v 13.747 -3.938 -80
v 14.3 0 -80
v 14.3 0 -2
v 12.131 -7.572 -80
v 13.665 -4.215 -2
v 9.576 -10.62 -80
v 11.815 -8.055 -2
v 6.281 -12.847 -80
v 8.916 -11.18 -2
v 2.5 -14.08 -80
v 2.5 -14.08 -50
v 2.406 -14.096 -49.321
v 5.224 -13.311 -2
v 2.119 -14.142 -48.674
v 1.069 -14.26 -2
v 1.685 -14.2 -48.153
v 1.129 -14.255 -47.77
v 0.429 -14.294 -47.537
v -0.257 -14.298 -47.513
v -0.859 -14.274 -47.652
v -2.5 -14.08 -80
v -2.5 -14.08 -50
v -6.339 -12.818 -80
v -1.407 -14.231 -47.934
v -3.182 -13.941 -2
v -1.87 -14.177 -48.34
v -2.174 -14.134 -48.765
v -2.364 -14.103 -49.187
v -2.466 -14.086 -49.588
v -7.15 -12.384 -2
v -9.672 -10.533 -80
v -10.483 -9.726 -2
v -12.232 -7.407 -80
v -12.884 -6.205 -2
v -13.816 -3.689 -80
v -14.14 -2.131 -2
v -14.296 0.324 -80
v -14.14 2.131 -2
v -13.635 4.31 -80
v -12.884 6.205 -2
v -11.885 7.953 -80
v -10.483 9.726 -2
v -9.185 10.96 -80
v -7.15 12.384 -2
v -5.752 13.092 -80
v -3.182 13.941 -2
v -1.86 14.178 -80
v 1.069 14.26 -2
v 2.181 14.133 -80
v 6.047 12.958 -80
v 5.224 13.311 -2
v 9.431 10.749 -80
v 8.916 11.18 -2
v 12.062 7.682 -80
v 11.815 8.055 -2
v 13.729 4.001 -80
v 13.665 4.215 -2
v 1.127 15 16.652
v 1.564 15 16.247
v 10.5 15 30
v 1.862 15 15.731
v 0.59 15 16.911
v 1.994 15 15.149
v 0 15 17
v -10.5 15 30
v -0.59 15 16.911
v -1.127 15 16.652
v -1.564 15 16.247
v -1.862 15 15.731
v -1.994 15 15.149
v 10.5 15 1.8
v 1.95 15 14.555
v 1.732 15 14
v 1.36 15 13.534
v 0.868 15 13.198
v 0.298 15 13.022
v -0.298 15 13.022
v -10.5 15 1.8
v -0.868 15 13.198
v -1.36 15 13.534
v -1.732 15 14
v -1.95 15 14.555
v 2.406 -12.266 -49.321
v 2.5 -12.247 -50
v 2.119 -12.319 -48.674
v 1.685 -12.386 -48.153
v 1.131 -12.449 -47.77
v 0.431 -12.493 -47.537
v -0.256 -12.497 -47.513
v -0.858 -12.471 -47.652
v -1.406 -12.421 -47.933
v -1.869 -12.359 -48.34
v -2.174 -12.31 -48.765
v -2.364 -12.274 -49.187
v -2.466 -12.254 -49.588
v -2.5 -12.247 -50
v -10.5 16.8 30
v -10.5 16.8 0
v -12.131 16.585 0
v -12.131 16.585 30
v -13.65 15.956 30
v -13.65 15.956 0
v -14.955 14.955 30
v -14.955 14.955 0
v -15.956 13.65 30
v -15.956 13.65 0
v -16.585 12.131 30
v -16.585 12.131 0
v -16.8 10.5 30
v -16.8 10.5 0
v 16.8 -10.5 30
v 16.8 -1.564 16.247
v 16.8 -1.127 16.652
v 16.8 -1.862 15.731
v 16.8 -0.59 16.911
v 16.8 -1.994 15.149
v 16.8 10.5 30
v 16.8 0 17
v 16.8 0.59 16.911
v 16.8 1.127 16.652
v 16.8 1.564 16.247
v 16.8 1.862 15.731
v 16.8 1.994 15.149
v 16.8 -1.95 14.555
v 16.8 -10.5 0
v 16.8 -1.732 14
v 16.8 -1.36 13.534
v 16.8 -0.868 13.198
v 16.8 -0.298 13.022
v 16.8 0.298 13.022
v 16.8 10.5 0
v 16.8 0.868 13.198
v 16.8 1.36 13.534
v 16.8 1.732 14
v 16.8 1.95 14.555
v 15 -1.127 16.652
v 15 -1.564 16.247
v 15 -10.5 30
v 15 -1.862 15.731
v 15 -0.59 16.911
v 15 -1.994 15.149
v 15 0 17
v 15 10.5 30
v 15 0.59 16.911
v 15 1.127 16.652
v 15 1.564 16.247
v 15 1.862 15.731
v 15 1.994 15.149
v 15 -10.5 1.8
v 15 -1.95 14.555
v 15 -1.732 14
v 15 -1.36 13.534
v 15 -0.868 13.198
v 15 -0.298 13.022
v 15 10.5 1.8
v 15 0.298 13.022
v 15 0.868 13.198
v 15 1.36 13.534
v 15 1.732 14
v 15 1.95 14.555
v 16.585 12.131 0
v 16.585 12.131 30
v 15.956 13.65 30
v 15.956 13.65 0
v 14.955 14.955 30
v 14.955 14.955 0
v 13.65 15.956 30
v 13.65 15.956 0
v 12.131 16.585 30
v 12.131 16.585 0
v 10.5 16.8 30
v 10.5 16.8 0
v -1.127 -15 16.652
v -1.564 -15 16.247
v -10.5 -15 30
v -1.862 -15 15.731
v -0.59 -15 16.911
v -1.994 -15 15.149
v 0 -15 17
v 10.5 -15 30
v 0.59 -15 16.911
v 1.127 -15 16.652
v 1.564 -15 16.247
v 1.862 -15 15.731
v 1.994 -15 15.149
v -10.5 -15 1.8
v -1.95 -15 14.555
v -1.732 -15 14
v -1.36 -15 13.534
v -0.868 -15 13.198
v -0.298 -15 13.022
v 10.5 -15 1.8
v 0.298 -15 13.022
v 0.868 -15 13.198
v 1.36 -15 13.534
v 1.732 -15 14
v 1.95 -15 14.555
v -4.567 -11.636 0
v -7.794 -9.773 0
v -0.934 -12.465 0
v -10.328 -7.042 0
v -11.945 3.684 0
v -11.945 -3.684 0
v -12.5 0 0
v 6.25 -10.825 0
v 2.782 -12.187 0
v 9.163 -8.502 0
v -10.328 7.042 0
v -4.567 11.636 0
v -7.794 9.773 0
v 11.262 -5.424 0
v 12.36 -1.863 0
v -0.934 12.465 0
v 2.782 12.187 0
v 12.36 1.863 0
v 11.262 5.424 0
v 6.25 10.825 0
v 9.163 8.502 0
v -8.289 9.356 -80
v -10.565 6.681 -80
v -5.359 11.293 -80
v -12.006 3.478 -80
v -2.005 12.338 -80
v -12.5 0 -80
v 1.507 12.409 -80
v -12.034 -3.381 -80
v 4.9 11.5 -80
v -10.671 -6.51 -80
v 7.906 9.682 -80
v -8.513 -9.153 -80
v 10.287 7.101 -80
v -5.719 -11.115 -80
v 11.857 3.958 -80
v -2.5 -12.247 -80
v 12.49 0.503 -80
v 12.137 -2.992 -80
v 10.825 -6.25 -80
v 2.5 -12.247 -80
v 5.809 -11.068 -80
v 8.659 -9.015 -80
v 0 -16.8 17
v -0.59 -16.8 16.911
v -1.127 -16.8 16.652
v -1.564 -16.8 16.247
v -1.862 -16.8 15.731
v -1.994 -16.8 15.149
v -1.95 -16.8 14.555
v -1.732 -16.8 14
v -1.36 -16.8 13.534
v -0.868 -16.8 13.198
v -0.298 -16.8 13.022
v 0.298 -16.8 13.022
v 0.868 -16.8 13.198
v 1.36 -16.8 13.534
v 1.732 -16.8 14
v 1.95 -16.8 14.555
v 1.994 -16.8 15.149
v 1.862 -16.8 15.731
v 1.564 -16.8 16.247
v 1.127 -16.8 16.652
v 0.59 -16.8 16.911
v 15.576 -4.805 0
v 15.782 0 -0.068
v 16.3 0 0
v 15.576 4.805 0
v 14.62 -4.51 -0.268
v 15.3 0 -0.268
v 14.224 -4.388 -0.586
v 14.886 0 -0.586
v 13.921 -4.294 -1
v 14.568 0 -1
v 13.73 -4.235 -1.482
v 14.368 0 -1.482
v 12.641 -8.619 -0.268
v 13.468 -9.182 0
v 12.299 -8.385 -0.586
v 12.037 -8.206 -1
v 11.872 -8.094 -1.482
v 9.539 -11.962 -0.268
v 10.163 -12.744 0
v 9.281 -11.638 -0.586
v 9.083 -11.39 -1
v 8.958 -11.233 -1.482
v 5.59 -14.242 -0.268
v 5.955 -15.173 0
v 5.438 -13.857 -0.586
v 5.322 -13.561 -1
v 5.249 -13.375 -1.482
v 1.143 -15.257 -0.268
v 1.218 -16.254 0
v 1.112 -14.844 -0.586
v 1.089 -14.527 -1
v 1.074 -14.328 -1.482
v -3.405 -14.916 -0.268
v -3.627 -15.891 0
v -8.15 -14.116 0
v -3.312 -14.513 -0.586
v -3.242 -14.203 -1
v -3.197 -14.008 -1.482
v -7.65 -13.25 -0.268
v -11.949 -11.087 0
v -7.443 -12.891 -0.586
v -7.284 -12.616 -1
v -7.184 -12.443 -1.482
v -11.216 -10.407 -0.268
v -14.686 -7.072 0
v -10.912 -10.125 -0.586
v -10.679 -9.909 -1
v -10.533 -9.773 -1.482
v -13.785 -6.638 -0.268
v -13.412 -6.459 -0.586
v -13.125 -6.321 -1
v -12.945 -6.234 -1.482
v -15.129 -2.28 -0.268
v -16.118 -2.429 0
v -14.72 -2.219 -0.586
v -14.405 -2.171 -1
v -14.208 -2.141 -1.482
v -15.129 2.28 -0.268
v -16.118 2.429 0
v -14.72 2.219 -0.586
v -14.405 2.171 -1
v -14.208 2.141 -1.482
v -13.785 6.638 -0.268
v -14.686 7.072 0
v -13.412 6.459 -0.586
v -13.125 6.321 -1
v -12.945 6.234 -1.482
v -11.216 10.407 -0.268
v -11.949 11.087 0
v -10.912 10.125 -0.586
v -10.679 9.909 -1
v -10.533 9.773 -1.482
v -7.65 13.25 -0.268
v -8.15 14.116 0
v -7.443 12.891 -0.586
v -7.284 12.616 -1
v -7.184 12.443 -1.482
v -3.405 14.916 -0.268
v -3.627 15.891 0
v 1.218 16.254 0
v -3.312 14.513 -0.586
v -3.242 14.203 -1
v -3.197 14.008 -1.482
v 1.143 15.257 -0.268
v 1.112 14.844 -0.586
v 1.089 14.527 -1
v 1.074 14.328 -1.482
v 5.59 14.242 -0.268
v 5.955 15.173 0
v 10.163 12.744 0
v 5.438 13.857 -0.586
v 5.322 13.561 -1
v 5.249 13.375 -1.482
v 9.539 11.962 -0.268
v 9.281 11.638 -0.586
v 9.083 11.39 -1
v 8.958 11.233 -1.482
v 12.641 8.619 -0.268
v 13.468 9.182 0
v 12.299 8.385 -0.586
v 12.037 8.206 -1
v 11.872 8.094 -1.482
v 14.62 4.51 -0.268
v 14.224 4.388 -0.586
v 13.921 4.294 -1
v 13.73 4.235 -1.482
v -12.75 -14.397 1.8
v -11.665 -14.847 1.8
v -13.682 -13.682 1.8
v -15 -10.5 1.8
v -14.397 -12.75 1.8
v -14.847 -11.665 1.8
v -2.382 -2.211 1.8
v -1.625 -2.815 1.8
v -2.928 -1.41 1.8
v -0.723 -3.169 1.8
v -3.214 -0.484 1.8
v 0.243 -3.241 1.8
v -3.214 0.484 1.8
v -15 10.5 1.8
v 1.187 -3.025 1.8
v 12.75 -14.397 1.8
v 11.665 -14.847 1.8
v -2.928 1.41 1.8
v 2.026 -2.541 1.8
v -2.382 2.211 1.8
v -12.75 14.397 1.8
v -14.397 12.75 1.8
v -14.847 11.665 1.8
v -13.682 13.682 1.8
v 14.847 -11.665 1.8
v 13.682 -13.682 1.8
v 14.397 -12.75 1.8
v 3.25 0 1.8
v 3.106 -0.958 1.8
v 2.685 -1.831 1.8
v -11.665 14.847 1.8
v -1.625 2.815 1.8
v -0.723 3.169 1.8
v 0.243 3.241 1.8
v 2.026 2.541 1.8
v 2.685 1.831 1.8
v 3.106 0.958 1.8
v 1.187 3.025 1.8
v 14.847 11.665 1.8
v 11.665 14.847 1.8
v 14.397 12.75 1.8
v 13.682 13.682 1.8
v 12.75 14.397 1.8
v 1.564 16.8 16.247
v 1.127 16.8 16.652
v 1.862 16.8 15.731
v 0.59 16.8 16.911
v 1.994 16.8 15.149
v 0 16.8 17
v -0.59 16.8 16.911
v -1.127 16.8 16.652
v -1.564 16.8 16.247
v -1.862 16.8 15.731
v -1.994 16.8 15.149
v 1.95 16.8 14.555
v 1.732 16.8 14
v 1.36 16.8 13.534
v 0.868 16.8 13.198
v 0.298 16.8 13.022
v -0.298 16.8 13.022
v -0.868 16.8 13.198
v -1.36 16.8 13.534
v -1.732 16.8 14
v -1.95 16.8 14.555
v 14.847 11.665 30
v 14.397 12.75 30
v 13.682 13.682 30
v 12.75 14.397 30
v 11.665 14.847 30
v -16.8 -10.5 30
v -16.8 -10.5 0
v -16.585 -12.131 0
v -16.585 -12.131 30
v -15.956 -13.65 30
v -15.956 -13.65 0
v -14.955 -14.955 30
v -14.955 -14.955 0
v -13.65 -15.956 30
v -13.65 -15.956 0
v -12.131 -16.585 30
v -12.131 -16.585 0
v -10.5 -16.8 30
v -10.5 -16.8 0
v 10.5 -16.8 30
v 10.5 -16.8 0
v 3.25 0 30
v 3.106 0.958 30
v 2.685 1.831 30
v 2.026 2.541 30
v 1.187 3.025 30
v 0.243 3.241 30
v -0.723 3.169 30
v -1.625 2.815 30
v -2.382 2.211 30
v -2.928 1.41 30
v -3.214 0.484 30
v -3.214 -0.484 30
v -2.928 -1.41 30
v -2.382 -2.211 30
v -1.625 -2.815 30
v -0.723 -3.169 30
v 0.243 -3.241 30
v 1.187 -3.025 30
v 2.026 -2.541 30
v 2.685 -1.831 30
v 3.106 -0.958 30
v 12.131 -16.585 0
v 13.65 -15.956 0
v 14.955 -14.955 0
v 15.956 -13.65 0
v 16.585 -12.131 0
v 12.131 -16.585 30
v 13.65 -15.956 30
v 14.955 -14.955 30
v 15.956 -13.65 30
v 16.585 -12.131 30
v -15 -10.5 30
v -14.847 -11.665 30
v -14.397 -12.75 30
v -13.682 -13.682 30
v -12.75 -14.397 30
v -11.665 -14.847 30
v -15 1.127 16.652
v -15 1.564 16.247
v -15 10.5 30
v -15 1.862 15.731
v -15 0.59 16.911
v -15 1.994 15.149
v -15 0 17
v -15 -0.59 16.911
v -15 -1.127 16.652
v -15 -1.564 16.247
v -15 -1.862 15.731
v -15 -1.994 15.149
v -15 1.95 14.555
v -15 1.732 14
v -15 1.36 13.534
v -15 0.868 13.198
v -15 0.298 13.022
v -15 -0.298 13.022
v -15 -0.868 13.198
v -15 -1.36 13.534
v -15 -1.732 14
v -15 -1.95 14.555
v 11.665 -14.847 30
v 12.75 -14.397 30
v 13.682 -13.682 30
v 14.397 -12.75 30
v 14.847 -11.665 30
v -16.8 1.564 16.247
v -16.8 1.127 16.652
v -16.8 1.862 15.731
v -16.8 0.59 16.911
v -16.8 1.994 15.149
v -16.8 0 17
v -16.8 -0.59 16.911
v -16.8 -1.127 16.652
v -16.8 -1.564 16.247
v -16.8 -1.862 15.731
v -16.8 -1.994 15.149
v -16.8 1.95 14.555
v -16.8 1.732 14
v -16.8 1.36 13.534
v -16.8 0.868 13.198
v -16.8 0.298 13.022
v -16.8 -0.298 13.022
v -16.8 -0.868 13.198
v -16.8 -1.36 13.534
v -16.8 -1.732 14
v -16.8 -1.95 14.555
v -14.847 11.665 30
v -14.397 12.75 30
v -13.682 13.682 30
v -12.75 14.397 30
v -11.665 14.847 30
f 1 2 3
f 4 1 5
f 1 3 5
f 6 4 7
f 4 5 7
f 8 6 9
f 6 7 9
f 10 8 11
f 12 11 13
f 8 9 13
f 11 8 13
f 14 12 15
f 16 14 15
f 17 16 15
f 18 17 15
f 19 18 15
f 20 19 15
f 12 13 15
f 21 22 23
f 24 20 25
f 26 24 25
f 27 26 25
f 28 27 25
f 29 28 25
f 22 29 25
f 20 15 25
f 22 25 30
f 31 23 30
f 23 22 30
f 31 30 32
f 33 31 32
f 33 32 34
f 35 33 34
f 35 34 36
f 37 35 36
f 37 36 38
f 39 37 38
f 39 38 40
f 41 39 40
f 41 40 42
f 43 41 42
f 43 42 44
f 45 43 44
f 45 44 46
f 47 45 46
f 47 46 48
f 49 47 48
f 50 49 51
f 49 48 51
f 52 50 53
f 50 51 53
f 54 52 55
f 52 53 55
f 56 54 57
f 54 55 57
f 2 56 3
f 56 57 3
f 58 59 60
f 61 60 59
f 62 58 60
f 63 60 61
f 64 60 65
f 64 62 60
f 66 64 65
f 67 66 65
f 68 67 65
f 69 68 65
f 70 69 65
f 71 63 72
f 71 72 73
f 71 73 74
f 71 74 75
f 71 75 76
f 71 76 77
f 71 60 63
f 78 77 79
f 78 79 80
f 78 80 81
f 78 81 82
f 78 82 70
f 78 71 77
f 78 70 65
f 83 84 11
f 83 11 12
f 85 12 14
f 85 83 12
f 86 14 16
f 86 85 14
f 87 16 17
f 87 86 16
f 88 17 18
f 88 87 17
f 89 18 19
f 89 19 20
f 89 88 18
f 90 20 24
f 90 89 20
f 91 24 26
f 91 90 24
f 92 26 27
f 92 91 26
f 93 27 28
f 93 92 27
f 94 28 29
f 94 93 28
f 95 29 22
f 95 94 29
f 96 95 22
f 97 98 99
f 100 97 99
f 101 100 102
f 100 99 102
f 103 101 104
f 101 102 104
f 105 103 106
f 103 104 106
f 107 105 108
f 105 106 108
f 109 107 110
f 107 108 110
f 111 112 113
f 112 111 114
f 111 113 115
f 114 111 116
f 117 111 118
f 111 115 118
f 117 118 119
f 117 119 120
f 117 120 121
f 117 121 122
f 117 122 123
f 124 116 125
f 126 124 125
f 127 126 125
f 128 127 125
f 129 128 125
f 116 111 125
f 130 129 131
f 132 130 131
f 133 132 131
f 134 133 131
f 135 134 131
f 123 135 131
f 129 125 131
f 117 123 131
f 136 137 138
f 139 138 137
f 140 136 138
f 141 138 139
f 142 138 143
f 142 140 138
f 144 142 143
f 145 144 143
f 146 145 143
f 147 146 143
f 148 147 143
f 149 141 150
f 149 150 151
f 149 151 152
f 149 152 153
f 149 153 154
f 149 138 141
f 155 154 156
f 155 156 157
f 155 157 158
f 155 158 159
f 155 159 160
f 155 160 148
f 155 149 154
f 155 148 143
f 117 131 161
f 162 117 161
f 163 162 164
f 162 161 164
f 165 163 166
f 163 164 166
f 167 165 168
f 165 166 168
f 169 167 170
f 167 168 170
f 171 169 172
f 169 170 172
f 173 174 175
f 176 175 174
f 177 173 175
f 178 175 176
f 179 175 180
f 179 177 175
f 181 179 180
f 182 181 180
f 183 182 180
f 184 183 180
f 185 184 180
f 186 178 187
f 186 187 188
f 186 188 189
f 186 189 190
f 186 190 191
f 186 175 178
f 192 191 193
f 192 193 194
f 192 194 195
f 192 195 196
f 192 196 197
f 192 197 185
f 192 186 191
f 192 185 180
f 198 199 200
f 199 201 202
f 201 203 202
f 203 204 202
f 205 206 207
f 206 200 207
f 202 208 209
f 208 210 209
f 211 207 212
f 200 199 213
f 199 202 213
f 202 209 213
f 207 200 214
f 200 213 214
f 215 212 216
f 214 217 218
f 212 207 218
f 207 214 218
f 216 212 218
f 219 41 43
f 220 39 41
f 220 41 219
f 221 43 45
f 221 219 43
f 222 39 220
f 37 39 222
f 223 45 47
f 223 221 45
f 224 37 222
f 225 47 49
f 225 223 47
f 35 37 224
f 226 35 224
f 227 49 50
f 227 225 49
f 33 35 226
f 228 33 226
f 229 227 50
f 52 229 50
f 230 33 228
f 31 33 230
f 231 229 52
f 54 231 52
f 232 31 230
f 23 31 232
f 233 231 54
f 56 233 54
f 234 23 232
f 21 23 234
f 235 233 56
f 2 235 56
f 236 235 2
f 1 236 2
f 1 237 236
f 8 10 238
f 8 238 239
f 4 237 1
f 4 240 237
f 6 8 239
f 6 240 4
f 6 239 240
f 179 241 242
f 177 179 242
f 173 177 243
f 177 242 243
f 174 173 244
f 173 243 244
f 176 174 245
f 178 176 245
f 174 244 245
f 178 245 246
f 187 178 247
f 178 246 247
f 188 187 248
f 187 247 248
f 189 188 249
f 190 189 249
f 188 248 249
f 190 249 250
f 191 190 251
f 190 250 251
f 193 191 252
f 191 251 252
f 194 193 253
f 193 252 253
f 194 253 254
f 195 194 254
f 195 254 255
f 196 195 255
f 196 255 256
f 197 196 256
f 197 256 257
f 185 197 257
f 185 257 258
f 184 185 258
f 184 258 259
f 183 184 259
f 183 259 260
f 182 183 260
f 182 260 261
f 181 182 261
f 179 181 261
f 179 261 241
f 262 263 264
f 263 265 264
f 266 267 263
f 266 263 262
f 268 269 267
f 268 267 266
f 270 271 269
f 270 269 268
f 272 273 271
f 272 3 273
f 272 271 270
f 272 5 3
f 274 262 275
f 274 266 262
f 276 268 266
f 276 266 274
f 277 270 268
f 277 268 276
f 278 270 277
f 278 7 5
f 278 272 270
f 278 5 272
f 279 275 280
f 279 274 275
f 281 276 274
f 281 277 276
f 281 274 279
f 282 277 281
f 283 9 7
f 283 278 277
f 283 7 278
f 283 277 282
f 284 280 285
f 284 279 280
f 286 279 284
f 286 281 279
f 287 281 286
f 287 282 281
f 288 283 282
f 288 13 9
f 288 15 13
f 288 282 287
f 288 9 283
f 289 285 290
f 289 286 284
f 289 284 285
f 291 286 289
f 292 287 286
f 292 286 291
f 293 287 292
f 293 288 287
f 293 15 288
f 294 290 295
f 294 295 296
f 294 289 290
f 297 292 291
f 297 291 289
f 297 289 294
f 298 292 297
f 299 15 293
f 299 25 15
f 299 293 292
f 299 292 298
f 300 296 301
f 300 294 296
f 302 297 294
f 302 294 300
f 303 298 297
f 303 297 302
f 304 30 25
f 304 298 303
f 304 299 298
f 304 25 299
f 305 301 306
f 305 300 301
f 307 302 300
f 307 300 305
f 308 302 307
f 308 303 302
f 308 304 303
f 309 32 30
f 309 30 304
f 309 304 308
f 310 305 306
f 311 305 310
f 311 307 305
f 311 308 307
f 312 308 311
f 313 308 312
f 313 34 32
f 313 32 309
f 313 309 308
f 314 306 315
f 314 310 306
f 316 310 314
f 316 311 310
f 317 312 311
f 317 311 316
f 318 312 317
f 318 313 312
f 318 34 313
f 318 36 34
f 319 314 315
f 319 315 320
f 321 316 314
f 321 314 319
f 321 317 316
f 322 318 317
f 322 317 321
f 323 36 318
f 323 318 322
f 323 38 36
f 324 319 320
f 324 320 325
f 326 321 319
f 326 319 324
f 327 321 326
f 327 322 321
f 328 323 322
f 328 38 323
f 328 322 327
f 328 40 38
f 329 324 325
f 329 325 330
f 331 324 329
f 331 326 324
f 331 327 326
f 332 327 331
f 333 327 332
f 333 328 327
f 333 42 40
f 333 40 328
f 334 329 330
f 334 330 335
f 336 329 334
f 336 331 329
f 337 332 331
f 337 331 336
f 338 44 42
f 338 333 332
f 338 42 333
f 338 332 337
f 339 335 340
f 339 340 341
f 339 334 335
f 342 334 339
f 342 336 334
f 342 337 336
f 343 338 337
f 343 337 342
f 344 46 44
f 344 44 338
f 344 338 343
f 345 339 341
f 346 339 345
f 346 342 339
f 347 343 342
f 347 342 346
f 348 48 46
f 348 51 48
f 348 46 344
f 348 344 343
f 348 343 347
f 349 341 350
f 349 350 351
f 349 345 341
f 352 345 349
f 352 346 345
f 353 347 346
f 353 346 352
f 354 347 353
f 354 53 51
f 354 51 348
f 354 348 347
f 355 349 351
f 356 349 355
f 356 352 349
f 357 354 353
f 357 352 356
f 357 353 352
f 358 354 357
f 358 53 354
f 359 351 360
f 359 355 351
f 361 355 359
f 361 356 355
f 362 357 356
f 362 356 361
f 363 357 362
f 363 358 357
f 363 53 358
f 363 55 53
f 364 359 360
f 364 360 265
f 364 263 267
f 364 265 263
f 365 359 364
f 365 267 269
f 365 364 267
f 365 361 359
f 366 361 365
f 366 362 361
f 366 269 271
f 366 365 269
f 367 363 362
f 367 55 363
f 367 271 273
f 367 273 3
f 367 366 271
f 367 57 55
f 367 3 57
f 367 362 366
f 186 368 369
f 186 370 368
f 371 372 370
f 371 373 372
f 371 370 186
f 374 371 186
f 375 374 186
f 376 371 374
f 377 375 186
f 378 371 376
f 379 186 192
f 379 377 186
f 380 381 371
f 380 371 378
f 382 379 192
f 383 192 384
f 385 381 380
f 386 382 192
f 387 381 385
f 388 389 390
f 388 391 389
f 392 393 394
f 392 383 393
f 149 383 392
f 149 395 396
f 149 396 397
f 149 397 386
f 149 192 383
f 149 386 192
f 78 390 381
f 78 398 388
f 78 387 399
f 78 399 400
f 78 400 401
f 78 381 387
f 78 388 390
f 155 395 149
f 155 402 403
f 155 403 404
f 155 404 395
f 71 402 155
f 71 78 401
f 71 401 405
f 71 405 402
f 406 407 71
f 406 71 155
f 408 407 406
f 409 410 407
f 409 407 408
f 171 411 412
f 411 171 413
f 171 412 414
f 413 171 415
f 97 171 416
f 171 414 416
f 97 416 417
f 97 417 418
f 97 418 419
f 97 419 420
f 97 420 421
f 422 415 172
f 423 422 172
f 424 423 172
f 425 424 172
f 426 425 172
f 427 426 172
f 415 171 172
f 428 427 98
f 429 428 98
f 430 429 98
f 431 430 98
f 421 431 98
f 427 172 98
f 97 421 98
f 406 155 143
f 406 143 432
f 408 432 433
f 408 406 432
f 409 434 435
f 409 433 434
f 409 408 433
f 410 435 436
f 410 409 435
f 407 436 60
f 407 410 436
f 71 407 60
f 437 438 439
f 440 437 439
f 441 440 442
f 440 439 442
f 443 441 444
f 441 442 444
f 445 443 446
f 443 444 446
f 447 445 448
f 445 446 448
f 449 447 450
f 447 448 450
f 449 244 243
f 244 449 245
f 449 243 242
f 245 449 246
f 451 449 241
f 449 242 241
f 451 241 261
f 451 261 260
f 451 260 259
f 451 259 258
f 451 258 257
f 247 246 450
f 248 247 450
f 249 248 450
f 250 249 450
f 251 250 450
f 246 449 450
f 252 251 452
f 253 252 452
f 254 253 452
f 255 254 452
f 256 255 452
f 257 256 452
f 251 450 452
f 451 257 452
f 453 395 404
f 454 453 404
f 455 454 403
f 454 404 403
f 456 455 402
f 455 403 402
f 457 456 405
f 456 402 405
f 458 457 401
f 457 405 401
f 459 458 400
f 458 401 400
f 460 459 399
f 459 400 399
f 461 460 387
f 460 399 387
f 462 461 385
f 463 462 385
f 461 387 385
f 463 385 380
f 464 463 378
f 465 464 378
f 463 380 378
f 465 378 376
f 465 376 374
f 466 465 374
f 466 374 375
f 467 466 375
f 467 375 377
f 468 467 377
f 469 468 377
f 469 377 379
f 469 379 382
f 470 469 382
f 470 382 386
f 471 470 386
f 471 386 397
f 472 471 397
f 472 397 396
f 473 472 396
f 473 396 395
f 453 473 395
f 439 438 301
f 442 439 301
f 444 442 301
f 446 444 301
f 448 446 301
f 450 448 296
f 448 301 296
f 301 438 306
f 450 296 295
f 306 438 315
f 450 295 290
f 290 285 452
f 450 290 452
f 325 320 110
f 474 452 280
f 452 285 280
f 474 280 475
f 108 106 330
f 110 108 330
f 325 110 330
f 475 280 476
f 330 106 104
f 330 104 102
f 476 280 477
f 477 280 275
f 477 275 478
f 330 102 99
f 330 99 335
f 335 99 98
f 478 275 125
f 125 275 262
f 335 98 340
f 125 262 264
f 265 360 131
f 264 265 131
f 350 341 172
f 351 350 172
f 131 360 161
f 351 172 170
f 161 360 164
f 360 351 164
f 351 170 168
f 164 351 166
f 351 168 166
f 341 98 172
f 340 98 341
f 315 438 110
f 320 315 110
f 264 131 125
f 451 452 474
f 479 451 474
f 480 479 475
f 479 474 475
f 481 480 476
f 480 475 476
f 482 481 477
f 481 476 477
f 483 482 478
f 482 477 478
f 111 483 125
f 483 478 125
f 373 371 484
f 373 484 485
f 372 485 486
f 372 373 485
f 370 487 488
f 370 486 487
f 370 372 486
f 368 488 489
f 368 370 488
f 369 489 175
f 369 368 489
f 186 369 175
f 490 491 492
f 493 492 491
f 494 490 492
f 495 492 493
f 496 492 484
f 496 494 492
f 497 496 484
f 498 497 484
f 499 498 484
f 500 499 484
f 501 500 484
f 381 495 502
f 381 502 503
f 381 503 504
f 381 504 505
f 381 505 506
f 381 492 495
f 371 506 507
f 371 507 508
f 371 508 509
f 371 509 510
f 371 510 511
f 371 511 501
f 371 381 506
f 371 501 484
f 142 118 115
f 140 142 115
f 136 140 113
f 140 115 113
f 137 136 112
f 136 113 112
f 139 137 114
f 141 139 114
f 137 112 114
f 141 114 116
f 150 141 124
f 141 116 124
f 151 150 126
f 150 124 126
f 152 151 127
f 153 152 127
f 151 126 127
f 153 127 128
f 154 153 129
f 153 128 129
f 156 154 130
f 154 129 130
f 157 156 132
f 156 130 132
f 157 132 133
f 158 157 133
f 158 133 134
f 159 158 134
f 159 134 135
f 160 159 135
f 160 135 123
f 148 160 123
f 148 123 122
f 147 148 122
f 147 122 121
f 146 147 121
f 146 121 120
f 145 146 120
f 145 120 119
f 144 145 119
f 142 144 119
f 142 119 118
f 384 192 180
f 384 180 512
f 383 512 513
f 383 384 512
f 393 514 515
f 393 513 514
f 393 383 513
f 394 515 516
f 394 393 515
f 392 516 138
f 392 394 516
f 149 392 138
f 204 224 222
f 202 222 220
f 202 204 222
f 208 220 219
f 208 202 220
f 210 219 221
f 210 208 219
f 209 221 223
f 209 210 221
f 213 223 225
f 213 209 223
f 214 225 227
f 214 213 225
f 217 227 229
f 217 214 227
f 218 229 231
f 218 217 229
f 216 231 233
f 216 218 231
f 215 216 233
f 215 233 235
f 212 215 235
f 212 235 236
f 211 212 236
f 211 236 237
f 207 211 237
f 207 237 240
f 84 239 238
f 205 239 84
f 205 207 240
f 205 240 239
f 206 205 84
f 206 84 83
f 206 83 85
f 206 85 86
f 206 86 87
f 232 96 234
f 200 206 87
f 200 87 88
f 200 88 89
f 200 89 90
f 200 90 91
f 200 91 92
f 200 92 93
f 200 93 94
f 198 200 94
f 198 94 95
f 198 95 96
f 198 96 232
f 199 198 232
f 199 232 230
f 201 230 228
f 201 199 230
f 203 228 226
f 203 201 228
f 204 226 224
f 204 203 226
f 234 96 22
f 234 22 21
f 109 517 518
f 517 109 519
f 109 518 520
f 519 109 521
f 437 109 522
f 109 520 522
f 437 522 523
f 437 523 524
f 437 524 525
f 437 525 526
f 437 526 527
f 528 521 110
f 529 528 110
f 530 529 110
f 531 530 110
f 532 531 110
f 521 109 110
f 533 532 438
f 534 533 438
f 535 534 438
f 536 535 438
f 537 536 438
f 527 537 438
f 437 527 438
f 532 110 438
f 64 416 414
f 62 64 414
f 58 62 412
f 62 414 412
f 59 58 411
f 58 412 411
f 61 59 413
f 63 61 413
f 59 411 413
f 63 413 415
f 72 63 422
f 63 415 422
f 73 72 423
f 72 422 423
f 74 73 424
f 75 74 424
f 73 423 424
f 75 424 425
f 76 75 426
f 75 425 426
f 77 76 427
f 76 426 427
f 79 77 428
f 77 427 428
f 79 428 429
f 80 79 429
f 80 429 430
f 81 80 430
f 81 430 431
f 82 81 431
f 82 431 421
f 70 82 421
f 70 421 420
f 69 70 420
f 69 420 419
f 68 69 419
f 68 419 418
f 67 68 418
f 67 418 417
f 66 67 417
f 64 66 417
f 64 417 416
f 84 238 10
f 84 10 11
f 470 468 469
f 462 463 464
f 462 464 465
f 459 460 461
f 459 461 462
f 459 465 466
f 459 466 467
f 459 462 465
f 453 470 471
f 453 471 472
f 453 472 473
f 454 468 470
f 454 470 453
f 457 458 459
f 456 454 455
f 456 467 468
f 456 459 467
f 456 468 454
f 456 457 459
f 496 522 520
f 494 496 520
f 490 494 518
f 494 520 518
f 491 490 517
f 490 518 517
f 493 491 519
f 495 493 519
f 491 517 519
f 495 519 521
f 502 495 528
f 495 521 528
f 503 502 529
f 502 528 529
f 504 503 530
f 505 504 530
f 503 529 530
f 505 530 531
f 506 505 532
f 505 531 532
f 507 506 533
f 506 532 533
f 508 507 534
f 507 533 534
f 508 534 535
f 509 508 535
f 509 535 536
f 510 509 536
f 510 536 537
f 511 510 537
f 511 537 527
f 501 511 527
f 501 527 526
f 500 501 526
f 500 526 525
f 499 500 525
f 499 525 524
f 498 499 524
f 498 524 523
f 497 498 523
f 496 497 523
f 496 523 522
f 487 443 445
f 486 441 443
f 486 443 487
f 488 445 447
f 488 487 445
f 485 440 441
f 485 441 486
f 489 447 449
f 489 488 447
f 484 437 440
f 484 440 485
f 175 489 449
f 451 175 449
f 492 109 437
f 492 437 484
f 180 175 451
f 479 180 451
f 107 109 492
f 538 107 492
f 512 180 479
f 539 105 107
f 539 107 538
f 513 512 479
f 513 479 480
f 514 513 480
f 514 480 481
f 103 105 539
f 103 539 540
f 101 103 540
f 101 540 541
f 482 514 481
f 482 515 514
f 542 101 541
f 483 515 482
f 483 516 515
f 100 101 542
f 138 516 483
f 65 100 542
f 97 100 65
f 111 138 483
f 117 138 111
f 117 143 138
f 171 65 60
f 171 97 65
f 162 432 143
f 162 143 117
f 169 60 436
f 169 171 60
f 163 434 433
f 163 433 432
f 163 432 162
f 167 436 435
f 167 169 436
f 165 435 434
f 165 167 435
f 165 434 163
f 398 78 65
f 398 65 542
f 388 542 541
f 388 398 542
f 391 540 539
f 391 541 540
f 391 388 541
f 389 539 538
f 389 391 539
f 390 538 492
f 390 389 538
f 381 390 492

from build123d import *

# Parameters (mm, degrees)
SKETCH_1_R               = 3.25
EXTRUDE_1_DEPTH          = 30
SHELL_1_T                = -1.8
SKETCH_1_3_R             = 3.25
EXTRUDE_2_DEPTH          = 30
CUT_EXTRUDE_1_REACH      = 50.075
SKETCH_2_R               = 2
PATTERN_CIRCULAR_1_COUNT = 4
SKETCH_3_R               = 14.3
SKETCH_3_R_2             = 12.5
EXTRUDE_3_DEPTH          = 80
CUT_EXTRUDE_2_REACH      = 85.453
CUT_EXTRUDE_2_END_RADIUS = 14.3
FILLET_1_R               = 2


with BuildPart() as part:
    # 草圖1 → 填料-伸長1 (new body)
    with BuildSketch(Plane.XY):
        with BuildLine():
            Line((10.5, 16.8), (-10.5, 16.8))
            ThreePointArc((-10.5, 16.8), (-14.954772721, 14.954772721), (-16.8, 10.5))
            Line((-16.8, 10.5), (-16.8, -10.5))
            ThreePointArc((-16.8, -10.5), (-14.954772721, -14.954772721), (-10.5, -16.8))
            Line((-10.5, -16.8), (10.5, -16.8))
            ThreePointArc((10.5, -16.8), (14.954772721, -14.954772721), (16.8, -10.5))
            Line((16.8, -10.5), (16.8, 10.5))
            ThreePointArc((16.8, 10.5), (14.954772721, 14.954772721), (10.5, 16.8))
        make_face()
        Circle(SKETCH_1_R, mode=Mode.SUBTRACT)
        Circle(SKETCH_1_R)
    extrude(amount=EXTRUDE_1_DEPTH)

    # 薄殼1
    shell_1_openings = [part.faces().sort_by_distance(p)[0] for p in [
        (0, 0, 30),
    ]]
    offset(amount=SHELL_1_T, openings=shell_1_openings, kind=Kind.INTERSECTION)

    # 草圖1<3> → 填料-伸長2 (add)
    with BuildSketch(Plane.XY):
        Circle(SKETCH_1_3_R)
    extrude(amount=EXTRUDE_2_DEPTH)

    # 草圖2 → 除料-伸長1 (cut, up to next)
    with BuildSketch(Plane(origin=(0, 16.8, 0), x_dir=(1, 0, 0), z_dir=(0, 1, 0)), mode=Mode.PRIVATE) as cut_extrude_1_sk1:
        with Locations(Location((0, -15, 0), (0, 0, 270))):
            Circle(SKETCH_2_R)
    cut_extrude_1_tool1 = extrude(cut_extrude_1_sk1.sketch, amount=-CUT_EXTRUDE_1_REACH, mode=Mode.PRIVATE) & part.part
    cut_extrude_1 = cut_extrude_1_tool1.solids().sort_by_distance((0, 16.8, 15))[0]
    add(cut_extrude_1, mode=Mode.SUBTRACT)

    # 環狀複製排列1: 除料-伸長1 ×4 about axis
    pattern_circular_1_axis = Axis((0, 0, 30), (0, 0, -1))
    for i in range(1, PATTERN_CIRCULAR_1_COUNT):
        add(cut_extrude_1.rotate(pattern_circular_1_axis, i * 360 / PATTERN_CIRCULAR_1_COUNT), mode=Mode.SUBTRACT)

    # 草圖3 → 填料-伸長3 (add)
    with BuildSketch(Plane(origin=(0, 0, 0), x_dir=(-1, 0, 0), z_dir=(0, 0, -1))):
        with Locations(Location((0, 0, 0), (0, 0, 180))):
            Circle(SKETCH_3_R)
        Circle(SKETCH_3_R_2, mode=Mode.SUBTRACT)
    extrude(amount=EXTRUDE_3_DEPTH)

    # 除料-伸長2: up to this cylinder (the profile starts inside it)
    cut_extrude_2_end = Plane(origin=(0, 0, -65.346562), z_dir=(0, 0, 1)) * Cylinder(CUT_EXTRUDE_2_END_RADIUS, 200.506, mode=Mode.PRIVATE)
    # 草圖4 → 除料-伸長2 (cut, up to the surface)
    with BuildSketch(Plane(origin=(0, 0, 0), x_dir=(1, 0, 0), z_dir=(0, 1, 0)), mode=Mode.PRIVATE) as cut_extrude_2_sk1:
        with BuildLine():
            Line((-2.5, 82.665609903), (2.5, 82.665609903))
            Line((2.5, 82.665609903), (2.5, 50))
            ThreePointArc((2.5, 50), (0, 47.5), (-2.5, 50))
            Line((-2.5, 50), (-2.5, 82.665609903))
        make_face()
    cut_extrude_2_tool1 = extrude(cut_extrude_2_sk1.sketch, amount=-CUT_EXTRUDE_2_REACH, mode=Mode.PRIVATE) & cut_extrude_2_end
    add(cut_extrude_2_tool1.solids().sort_by_distance((0, 0, -65.346562))[0], mode=Mode.SUBTRACT)

    # 圓角1
    fillet_1_edges = [part.edges().sort_by_distance(p)[0] for p in [
        (-14.3, 0, 0),
    ]]
    fillet(fillet_1_edges, radius=FILLET_1_R)


solid = part.part
